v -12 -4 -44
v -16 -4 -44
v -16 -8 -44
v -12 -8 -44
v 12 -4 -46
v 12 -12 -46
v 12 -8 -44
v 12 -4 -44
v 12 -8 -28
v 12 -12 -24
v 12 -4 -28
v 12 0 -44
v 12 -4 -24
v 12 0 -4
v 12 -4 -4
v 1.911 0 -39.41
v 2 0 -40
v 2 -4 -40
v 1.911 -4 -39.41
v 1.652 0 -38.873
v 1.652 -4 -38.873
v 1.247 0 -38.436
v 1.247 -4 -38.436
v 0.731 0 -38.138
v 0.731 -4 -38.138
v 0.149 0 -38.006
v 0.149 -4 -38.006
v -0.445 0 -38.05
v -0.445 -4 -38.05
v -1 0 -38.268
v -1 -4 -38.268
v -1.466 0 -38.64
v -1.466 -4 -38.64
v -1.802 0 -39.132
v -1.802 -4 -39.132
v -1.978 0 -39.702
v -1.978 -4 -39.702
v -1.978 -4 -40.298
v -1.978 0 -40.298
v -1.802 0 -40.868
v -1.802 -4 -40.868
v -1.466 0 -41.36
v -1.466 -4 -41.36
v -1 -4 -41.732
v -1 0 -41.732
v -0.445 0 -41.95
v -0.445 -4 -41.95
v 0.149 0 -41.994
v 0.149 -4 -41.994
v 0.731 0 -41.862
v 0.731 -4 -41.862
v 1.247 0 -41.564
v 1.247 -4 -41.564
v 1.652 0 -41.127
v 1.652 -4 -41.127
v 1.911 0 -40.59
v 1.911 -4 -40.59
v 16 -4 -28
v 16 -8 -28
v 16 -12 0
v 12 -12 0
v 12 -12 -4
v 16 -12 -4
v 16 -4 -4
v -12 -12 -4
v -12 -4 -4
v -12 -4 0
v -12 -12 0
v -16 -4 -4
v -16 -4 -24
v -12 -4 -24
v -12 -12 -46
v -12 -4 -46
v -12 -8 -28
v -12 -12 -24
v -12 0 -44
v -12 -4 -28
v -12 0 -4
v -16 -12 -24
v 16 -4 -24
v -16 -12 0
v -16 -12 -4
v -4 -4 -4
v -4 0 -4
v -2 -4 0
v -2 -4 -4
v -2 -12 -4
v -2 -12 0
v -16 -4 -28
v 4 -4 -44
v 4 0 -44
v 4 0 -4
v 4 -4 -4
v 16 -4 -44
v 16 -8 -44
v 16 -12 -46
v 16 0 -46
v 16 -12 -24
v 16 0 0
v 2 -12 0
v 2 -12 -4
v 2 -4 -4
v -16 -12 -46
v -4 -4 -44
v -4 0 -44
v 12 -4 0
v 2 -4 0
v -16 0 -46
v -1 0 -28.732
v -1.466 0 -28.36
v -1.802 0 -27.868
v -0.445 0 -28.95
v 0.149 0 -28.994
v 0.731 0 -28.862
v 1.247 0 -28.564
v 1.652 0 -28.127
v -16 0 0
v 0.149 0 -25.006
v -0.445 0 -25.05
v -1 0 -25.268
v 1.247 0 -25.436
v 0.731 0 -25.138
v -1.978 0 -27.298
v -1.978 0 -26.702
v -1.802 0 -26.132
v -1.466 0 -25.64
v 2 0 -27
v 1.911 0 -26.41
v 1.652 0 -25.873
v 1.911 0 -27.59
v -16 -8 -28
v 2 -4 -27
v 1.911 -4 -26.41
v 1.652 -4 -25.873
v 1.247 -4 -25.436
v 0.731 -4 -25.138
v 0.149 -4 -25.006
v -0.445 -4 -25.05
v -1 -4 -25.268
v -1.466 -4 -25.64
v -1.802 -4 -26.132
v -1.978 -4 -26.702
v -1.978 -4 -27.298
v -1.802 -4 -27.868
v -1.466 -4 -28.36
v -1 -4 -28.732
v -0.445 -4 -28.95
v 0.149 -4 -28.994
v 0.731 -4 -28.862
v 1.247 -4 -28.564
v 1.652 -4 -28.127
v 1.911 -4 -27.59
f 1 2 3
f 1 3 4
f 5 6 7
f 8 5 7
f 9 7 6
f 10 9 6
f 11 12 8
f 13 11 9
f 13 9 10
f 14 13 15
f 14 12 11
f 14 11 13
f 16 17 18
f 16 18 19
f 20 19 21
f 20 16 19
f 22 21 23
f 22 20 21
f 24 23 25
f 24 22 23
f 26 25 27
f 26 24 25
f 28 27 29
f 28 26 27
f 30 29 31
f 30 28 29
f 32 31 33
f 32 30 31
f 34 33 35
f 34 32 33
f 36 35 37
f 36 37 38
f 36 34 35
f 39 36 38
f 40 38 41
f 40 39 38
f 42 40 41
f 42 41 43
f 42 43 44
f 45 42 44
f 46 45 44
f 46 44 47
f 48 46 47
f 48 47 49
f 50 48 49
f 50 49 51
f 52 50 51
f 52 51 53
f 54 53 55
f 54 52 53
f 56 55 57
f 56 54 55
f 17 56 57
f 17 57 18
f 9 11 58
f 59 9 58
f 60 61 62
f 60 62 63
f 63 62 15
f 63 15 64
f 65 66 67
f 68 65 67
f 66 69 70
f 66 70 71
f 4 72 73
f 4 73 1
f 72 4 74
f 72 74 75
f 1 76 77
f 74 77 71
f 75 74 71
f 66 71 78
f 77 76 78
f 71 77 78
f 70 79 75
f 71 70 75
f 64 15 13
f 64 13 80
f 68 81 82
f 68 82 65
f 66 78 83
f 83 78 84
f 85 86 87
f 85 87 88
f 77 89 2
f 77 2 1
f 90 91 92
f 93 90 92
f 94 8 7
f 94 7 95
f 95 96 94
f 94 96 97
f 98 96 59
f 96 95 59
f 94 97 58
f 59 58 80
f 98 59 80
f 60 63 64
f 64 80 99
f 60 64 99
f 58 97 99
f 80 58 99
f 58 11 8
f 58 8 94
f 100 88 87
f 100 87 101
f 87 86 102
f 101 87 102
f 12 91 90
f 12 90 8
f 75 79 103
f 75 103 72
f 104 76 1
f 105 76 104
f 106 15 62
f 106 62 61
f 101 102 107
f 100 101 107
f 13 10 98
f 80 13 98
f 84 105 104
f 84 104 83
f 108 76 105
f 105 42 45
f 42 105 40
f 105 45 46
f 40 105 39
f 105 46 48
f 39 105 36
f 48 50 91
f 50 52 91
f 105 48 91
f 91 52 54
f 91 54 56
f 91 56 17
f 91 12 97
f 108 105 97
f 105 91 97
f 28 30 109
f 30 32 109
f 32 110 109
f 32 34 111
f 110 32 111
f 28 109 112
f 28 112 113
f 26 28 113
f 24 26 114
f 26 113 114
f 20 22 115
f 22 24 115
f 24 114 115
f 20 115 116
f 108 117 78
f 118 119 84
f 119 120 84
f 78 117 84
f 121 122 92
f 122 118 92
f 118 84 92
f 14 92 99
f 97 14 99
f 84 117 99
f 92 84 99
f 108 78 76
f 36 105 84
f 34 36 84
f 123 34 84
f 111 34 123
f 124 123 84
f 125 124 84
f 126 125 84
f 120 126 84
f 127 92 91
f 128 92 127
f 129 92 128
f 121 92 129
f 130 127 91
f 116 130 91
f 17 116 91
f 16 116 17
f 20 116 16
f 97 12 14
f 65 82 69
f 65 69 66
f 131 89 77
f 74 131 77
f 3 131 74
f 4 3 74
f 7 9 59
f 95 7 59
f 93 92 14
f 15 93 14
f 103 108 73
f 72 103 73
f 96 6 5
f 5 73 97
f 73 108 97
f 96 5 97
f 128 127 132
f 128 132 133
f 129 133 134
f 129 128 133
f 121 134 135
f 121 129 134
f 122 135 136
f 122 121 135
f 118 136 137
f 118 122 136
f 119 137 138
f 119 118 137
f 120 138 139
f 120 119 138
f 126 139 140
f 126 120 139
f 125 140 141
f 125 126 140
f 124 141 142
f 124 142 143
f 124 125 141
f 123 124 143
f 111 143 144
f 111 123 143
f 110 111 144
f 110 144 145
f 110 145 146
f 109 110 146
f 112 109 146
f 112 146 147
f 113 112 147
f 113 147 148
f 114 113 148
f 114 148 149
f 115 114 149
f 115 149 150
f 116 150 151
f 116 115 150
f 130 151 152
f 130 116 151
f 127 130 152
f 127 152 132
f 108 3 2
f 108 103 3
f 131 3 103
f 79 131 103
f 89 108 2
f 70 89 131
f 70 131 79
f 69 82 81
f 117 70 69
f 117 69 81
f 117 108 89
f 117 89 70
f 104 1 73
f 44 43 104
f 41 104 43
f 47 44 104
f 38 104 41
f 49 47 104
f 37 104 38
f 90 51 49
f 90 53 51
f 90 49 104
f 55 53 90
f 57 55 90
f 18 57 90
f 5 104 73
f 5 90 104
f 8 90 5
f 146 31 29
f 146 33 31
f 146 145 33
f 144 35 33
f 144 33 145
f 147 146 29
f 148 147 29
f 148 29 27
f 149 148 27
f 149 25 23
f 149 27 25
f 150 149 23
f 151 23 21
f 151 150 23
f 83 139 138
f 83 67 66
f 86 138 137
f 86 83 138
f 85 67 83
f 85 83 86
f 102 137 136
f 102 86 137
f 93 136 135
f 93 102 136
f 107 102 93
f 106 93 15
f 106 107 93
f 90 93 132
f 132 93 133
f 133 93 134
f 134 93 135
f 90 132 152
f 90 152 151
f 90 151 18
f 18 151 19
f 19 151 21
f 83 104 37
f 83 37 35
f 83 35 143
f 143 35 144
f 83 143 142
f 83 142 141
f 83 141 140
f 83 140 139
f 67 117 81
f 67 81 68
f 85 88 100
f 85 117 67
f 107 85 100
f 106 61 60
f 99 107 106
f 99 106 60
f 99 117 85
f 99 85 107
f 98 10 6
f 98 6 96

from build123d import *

# Parameters (mm, degrees)
F0_W     = 32
F0_H     = 46
F0_W_2   = 8
F0_H_2   = 40
F0_R     = 2
F1_DEPTH = 4
F2_W     = 4
F2_H     = 4
F2_H_2   = 2
F3_DEPTH = 8
F4_W     = 4
F4_H     = 22
F5_DEPTH = 4


with BuildPart() as f1:
    # F0 (on Front) → F1 (new body)
    with BuildSketch(Plane.XZ):
        with Locations((0, -23)):
            Rectangle(F0_W, F0_H)
        with Locations((-8, -24)):
            Rectangle(F0_W_2, F0_H_2, mode=Mode.SUBTRACT)
        with Locations((0, -40)):
            Circle(F0_R, mode=Mode.SUBTRACT)
        with Locations((0, -27)):
            Circle(F0_R, mode=Mode.SUBTRACT)
        with Locations((8, -24)):
            Rectangle(F0_W_2, F0_H_2, mode=Mode.SUBTRACT)
    extrude(amount=F1_DEPTH)

    # F2 (on face) → F3 (join)
    with BuildSketch(Plane.XZ.offset(4)):
        with Locations((-14, -2)):
            Rectangle(F2_W, F2_H)
        with Locations((14, -2)):
            Rectangle(F2_W, F2_H)
        with Locations((0, -2)):
            Rectangle(F2_W, F2_H)
        with Locations((-14, -26)):
            Rectangle(F2_W, F2_H)
        with Locations((14, -26)):
            Rectangle(F2_W, F2_H)
        with Locations((-14, -45)):
            Rectangle(F2_W, F2_H_2)
        with Locations((14, -45)):
            Rectangle(F2_W, F2_H_2)
    extrude(amount=F3_DEPTH)

    # F4 (on face) → F5 (join)
    with BuildSketch(Plane.XZ.offset(12)):
        with Locations((-14, -35)):
            Rectangle(F4_W, F4_H)
        with Locations((14, -35)):
            Rectangle(F4_W, F4_H)
    extrude(amount=-F5_DEPTH)


solid = f1.part
